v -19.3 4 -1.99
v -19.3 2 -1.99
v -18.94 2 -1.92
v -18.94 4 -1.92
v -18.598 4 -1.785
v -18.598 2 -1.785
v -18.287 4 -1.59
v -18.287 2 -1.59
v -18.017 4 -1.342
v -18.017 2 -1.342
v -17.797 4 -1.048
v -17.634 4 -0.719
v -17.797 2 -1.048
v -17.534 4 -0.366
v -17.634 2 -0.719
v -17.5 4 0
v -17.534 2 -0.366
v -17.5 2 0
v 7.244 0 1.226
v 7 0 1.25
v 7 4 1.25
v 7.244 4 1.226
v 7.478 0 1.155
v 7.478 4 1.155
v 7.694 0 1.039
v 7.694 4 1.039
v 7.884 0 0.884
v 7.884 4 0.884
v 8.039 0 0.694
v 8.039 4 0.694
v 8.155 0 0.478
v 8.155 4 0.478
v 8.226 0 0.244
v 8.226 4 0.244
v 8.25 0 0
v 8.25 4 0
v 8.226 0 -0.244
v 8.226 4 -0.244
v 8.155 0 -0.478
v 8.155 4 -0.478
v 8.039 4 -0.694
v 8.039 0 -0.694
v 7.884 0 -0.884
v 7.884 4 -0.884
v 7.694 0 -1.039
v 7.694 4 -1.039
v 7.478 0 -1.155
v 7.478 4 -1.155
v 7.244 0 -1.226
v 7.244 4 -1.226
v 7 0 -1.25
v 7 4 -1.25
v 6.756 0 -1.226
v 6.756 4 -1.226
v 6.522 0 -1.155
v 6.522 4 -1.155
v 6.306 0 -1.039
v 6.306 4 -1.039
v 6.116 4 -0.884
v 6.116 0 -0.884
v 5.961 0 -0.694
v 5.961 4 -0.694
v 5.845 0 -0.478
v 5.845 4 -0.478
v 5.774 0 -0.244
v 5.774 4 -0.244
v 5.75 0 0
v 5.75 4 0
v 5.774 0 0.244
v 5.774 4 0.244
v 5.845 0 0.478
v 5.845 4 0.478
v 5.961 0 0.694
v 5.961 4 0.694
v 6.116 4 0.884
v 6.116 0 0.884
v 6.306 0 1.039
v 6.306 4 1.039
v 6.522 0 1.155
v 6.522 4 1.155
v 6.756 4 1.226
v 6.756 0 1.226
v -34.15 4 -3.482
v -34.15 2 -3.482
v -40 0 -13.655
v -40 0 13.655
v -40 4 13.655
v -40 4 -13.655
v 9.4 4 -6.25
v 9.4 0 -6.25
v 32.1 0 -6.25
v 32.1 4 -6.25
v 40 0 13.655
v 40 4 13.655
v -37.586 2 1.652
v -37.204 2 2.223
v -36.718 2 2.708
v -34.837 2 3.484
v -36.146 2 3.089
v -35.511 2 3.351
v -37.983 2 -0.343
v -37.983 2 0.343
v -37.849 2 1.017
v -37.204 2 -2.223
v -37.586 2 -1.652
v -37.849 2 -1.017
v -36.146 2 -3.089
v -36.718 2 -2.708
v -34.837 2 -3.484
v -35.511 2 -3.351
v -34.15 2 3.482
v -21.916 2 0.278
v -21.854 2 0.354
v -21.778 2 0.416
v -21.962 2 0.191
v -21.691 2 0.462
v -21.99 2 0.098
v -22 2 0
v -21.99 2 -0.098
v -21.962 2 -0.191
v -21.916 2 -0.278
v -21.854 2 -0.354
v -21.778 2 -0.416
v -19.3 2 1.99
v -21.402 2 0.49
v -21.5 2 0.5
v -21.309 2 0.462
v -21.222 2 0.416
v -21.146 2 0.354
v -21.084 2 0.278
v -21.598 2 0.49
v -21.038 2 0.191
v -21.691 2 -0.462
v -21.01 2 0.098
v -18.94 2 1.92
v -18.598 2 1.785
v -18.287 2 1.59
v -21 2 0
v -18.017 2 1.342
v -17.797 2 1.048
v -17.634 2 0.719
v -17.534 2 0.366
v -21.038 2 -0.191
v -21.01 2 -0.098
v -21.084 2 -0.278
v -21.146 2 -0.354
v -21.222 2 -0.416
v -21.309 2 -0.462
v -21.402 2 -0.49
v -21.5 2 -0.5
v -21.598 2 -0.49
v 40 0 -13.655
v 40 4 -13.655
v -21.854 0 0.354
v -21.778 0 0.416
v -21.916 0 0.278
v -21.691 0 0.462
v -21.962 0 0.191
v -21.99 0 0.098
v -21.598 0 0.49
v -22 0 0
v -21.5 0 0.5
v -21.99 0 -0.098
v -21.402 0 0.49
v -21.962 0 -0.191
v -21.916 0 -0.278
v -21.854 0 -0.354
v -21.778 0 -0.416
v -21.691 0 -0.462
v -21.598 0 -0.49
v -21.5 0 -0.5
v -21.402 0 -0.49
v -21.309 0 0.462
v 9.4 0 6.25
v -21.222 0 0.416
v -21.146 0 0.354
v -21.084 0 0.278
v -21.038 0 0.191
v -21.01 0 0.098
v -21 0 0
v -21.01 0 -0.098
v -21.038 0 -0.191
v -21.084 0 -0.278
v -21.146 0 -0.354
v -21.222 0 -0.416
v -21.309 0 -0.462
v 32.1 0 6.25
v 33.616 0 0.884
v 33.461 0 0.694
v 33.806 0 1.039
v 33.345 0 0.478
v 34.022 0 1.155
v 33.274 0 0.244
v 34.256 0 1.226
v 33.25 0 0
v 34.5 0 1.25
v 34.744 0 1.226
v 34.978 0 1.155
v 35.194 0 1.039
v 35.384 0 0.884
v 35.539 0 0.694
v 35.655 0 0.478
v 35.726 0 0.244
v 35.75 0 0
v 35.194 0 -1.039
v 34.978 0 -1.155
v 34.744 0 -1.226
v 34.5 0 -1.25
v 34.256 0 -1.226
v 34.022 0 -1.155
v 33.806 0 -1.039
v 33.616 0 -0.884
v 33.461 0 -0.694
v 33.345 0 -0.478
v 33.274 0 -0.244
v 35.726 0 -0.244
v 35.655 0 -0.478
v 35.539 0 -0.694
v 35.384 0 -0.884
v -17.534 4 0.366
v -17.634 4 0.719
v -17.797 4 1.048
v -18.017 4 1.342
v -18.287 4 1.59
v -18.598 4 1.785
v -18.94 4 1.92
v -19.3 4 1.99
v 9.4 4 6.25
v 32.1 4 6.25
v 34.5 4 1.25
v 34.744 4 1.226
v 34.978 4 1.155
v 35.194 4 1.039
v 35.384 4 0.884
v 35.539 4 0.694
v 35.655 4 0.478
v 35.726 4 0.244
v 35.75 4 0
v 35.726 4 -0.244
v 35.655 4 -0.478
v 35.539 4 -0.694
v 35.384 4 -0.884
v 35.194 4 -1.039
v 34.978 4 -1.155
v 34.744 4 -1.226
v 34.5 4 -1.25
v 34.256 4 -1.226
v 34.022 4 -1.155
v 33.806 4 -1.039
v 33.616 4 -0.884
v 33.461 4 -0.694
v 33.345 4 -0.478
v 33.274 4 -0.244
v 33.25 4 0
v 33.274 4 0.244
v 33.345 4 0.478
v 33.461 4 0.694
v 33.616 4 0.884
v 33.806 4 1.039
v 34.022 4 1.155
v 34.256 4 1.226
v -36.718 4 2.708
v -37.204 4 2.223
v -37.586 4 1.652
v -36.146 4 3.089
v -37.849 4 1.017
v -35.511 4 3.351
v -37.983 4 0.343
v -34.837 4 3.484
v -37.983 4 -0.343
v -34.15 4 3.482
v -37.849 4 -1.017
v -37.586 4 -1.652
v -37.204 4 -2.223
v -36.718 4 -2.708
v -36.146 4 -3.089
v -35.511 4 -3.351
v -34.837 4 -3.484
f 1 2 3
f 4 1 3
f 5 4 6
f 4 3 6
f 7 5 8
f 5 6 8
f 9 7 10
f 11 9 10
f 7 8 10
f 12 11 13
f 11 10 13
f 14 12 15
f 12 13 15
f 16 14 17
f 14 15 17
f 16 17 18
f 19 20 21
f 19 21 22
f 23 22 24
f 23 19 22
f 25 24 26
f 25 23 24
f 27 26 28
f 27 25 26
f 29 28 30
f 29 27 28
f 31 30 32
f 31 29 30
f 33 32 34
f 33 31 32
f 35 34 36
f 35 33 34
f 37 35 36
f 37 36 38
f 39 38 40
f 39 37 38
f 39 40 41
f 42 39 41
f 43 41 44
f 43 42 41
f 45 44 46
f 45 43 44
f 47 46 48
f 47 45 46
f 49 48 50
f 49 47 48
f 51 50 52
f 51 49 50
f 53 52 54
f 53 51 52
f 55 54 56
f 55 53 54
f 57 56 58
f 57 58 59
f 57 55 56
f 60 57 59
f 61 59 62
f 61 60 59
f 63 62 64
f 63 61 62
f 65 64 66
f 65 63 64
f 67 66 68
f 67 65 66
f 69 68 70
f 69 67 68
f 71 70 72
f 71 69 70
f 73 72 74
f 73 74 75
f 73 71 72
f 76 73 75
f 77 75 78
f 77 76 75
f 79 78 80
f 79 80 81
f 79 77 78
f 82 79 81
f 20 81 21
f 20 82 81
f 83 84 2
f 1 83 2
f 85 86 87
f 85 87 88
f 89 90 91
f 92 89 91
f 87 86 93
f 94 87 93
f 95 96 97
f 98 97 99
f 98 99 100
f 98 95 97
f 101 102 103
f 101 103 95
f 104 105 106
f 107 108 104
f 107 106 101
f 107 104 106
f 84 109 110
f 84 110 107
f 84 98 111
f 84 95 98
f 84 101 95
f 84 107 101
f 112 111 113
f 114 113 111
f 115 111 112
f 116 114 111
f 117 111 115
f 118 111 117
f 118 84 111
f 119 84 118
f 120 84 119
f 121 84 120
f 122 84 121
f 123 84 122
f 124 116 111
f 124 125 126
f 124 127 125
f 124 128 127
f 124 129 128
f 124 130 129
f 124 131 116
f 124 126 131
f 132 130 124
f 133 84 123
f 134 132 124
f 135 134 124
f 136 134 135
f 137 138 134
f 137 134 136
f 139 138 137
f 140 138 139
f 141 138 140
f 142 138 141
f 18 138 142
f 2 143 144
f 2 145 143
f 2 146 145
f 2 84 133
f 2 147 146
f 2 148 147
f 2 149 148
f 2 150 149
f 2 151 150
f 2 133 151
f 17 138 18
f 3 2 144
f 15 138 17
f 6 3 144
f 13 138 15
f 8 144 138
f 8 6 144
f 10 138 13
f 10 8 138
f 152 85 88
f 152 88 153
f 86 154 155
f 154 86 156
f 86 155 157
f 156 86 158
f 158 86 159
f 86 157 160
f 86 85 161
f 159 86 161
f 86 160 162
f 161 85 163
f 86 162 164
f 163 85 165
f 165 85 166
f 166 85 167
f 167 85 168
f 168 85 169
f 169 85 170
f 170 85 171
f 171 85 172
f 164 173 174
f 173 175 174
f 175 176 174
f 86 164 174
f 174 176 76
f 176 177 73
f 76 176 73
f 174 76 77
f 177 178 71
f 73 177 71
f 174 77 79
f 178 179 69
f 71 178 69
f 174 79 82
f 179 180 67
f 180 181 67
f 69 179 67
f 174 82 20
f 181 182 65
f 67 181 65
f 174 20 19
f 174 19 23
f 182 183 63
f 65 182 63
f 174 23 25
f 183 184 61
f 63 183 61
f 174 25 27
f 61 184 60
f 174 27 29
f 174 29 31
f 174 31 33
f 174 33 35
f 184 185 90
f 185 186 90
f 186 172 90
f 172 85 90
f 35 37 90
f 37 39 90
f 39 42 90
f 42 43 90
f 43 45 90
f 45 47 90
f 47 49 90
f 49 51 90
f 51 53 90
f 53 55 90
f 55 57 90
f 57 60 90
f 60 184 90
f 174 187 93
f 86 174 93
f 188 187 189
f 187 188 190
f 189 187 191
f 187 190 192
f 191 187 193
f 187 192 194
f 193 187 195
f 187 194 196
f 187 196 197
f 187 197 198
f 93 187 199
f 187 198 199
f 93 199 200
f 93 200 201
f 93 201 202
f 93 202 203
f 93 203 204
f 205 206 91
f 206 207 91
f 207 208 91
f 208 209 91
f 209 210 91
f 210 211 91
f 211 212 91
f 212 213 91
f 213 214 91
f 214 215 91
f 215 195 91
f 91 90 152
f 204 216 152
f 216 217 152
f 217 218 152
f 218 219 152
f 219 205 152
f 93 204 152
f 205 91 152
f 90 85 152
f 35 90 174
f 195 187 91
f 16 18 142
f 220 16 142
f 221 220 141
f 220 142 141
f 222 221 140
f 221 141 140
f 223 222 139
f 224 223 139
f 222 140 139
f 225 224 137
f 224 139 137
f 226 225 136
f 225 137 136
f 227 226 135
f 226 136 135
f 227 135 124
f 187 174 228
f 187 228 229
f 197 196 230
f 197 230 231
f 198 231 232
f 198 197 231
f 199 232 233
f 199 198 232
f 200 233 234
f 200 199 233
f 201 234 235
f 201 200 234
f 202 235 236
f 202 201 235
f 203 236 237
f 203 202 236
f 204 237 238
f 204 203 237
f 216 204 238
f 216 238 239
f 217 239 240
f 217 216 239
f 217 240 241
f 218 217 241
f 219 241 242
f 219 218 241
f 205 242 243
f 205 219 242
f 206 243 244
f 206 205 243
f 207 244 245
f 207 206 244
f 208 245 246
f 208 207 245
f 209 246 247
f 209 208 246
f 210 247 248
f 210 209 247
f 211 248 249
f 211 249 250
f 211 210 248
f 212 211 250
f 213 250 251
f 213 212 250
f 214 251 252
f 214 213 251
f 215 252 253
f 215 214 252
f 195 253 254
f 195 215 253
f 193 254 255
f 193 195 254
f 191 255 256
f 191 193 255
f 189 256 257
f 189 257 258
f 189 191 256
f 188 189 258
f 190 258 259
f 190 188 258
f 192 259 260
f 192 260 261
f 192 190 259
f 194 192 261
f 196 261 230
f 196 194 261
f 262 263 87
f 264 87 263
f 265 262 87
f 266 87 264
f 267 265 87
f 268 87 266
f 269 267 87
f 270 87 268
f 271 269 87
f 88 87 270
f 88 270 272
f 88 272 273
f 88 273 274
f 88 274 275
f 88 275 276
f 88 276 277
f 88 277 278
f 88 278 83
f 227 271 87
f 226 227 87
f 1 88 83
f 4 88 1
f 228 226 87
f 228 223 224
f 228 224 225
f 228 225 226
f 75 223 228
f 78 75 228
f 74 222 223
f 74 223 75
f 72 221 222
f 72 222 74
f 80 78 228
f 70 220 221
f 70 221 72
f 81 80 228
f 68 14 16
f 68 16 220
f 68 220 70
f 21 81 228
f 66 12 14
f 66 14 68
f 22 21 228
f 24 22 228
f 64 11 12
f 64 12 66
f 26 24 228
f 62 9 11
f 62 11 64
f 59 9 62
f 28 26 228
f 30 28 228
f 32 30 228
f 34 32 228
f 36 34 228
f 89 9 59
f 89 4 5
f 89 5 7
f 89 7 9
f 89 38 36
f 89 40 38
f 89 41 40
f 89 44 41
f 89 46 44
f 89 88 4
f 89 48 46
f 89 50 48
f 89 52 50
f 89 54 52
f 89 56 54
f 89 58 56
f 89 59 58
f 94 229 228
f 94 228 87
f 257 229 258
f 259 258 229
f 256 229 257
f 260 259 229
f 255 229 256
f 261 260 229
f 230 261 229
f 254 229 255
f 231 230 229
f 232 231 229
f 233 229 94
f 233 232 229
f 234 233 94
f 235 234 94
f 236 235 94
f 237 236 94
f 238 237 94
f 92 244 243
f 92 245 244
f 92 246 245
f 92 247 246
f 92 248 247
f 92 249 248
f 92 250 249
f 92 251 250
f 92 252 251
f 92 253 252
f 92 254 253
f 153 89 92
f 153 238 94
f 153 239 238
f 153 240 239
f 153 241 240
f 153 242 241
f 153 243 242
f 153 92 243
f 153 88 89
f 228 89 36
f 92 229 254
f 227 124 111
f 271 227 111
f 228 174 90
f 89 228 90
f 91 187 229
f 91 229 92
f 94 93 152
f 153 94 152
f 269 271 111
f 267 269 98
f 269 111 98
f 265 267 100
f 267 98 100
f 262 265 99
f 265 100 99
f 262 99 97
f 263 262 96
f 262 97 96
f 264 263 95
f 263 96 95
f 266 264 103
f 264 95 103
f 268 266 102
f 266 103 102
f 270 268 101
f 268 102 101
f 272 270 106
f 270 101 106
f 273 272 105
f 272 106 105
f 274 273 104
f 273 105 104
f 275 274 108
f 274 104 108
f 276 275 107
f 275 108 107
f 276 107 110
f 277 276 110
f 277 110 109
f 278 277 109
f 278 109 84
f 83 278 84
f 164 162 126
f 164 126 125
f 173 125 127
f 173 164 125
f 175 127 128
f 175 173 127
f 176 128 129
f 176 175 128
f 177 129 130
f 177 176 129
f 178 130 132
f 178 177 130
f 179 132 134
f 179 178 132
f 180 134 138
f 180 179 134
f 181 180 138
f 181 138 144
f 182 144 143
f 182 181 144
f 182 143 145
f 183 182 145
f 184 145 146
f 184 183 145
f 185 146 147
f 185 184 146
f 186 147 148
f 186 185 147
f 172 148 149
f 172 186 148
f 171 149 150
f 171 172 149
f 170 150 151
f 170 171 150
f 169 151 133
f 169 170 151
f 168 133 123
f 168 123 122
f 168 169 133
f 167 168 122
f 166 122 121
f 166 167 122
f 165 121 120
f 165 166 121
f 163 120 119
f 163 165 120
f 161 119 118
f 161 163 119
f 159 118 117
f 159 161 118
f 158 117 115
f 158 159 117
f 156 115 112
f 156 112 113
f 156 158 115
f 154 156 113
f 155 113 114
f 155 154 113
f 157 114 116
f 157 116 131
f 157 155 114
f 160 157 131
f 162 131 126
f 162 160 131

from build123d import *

# Parameters (mm, degrees)
SKETCH_1_W      = 80
SKETCH_1_H      = 27.309222572
SKETCH_1_R      = 1.25
SKETCH_1_W_2    = 22.7
SKETCH_1_H_2    = 12.5
EXTRUDE_2_DEPTH = 4
SKETCH_1_4_R    = 0.5
EXTRUDE_3_DEPTH = 2


with BuildPart() as part:
    # 草图1 → 凸台-拉伸2 (new body)
    with BuildSketch(Plane(origin=(0, 0, 0), x_dir=(1, 0, 0), z_dir=(0, 1, 0))):
        Rectangle(SKETCH_1_W, SKETCH_1_H)
        with BuildLine():
            ThreePointArc((-34.15, -3.48245603), (-38, 0), (-34.15, 3.48245603))
            Line((-34.15, 3.48245603), (-19.3, 1.989974874))
            ThreePointArc((-19.3, 1.989974874), (-18.016760303, 1.341640786), (-17.5, 0))
            ThreePointArc((-17.5, 0), (-18.016760303, -1.341640786), (-19.3, -1.989974874))
            Line((-19.3, -1.989974874), (-34.15, -3.48245603))
        make_face(mode=Mode.SUBTRACT)
        with Locations((7, 0)):
            Circle(SKETCH_1_R, mode=Mode.SUBTRACT)
        with Locations((20.75, 0)):
            Rectangle(SKETCH_1_W_2, SKETCH_1_H_2, mode=Mode.SUBTRACT)
        with Locations((34.5, 0)):
            Circle(SKETCH_1_R, mode=Mode.SUBTRACT)
    extrude(amount=EXTRUDE_2_DEPTH)

    # 草图1<4> → 凸台-拉伸3 (add)
    with BuildSketch(Plane(origin=(0, 0, 0), x_dir=(1, 0, 0), z_dir=(0, 1, 0))):
        with BuildLine():
            Line((-19.3, 1.989974874), (-34.15, 3.48245603))
            ThreePointArc((-34.15, 3.48245603), (-38, 0), (-34.15, -3.48245603))
            Line((-34.15, -3.48245603), (-19.3, -1.989974874))
            ThreePointArc((-19.3, -1.989974874), (-17.5, 0), (-19.3, 1.989974874))
        make_face()
        with Locations((-21.5, 0)):
            Circle(SKETCH_1_4_R, mode=Mode.SUBTRACT)
    extrude(amount=EXTRUDE_3_DEPTH)


solid = part.part
